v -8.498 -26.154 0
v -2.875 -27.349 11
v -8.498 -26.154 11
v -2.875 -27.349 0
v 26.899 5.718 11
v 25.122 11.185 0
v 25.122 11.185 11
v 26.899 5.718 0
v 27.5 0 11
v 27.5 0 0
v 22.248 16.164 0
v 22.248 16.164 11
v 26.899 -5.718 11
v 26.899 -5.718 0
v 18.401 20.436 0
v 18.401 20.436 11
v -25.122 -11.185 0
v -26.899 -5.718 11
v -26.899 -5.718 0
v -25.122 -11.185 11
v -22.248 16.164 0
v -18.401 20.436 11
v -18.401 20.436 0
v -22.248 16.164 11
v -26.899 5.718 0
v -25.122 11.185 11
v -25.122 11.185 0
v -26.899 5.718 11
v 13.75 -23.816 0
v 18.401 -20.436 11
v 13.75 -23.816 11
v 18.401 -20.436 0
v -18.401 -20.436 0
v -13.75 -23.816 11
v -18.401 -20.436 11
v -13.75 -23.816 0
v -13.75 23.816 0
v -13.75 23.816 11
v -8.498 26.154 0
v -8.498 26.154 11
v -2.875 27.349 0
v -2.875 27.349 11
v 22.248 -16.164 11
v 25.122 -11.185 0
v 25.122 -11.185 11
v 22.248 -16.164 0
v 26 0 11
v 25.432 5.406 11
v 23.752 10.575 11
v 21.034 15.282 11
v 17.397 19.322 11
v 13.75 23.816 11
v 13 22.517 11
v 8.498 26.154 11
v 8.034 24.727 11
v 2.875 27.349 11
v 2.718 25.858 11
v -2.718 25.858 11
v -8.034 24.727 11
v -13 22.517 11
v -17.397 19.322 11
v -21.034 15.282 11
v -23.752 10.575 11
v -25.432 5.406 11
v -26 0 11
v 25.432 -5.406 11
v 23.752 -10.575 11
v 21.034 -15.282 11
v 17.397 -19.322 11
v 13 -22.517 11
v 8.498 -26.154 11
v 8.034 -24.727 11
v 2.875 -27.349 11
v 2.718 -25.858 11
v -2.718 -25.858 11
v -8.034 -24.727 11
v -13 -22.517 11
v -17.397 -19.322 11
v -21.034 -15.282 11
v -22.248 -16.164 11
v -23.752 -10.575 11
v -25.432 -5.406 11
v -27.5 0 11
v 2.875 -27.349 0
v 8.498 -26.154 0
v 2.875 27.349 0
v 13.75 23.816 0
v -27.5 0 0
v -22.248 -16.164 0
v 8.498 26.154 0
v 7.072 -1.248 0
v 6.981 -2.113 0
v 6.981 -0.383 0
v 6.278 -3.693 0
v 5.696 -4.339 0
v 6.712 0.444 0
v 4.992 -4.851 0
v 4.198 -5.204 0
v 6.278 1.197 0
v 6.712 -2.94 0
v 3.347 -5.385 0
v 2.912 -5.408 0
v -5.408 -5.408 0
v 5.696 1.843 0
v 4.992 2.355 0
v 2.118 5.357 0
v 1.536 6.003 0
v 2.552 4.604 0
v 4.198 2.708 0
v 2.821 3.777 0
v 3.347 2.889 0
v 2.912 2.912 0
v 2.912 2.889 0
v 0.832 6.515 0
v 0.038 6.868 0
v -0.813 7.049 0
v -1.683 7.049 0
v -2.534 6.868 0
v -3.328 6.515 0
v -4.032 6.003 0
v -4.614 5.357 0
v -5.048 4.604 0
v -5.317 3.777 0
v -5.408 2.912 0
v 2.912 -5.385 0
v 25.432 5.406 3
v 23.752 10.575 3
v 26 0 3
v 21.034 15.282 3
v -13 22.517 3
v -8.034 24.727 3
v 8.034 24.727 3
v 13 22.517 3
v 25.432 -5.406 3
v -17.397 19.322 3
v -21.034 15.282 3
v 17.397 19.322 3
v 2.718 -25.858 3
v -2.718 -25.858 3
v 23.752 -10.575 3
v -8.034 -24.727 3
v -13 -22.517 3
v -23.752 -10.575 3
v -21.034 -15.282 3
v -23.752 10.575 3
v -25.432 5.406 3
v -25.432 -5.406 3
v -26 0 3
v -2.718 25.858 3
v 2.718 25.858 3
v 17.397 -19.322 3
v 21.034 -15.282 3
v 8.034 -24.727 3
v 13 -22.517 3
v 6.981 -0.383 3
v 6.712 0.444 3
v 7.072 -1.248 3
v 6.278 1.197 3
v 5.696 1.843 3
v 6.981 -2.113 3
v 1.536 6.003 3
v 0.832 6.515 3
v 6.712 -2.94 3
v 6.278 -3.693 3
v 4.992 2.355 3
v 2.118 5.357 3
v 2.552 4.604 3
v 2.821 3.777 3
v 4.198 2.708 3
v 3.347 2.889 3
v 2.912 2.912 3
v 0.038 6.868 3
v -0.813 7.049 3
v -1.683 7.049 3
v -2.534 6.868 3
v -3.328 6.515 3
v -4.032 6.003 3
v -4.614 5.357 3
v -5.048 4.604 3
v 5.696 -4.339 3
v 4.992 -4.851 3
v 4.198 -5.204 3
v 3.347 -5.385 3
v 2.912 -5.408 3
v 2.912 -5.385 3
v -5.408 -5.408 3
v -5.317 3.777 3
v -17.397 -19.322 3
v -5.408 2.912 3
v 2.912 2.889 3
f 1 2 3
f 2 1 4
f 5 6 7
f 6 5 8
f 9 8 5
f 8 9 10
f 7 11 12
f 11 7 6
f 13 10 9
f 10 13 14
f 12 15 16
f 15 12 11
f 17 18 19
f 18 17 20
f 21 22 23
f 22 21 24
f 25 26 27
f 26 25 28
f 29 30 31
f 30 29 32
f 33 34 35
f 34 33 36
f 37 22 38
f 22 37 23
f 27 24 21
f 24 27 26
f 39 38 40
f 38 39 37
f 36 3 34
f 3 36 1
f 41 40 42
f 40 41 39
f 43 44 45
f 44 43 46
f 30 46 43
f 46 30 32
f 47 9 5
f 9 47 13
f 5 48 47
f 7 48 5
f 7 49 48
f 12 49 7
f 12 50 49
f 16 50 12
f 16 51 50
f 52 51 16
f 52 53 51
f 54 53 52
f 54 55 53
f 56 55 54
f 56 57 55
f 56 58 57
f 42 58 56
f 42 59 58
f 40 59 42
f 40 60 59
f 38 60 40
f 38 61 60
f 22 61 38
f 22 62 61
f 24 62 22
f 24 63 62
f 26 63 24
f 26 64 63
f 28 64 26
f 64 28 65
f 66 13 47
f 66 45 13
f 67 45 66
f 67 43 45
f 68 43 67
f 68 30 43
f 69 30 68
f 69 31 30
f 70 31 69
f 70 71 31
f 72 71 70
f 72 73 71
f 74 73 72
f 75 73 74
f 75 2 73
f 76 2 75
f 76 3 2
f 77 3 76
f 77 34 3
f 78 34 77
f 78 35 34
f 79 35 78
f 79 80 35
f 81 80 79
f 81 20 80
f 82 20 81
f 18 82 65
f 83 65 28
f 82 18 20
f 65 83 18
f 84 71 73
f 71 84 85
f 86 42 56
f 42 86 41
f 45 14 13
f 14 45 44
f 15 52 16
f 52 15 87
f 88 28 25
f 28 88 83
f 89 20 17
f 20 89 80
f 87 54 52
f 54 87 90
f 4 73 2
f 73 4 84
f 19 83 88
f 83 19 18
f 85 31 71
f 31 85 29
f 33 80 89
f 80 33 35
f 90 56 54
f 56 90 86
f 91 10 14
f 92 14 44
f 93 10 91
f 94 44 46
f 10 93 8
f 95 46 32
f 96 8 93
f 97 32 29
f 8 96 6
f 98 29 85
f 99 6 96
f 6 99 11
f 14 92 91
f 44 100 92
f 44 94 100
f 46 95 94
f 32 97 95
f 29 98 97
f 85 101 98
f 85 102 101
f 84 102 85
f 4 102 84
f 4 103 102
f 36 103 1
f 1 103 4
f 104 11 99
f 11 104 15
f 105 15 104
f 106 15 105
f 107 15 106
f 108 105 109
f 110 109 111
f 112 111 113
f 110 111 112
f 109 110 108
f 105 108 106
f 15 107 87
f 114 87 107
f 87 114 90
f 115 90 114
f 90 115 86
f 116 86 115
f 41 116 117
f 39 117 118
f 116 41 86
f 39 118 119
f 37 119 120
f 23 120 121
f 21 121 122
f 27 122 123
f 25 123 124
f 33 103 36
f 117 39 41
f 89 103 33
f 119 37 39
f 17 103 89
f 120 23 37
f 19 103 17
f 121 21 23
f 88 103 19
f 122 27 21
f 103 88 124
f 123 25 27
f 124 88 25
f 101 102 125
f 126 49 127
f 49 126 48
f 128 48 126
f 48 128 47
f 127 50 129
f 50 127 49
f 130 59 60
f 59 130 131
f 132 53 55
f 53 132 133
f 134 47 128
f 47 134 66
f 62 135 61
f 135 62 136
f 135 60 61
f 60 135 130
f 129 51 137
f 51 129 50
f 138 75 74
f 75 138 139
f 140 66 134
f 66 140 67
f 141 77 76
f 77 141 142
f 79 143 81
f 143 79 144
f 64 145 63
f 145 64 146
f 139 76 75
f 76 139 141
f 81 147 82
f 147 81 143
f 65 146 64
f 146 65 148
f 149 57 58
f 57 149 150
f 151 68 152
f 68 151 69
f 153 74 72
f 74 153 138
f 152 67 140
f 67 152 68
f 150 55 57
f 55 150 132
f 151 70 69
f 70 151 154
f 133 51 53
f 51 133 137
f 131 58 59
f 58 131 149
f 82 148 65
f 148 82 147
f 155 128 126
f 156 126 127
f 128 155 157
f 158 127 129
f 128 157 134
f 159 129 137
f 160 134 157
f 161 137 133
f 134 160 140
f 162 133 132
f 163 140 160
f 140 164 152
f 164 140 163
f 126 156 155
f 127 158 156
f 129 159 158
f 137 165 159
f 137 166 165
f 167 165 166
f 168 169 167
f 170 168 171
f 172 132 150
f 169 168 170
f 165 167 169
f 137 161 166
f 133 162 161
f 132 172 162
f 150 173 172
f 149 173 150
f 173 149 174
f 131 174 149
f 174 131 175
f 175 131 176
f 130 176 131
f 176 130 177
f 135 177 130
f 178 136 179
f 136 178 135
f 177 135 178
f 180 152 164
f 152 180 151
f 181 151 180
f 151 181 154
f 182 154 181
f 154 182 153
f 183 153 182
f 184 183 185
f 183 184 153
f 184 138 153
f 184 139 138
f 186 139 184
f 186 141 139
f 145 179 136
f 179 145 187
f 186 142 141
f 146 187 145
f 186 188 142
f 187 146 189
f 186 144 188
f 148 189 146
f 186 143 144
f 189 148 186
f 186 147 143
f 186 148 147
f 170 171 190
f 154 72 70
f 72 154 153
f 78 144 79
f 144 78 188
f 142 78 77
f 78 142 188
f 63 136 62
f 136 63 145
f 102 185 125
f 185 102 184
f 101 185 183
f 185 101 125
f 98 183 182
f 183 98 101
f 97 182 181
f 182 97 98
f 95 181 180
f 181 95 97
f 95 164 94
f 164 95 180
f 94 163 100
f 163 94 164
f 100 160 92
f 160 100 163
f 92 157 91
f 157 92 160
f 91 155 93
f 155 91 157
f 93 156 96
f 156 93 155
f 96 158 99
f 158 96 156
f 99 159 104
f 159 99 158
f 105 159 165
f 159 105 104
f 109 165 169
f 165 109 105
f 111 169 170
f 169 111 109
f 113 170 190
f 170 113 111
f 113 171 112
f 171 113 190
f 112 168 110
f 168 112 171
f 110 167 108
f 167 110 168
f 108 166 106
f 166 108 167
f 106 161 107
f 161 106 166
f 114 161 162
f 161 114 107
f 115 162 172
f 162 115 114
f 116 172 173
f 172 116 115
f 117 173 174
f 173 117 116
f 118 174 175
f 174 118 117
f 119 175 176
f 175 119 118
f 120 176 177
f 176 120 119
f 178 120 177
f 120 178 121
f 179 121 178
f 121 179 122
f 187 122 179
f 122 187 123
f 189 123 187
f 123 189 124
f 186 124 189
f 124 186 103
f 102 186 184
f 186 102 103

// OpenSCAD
// could be changed
lens_outer_radius=52;
heart_size_factor=0.008;
wall_thickness=3;
shaft_leght=8;

//don`t change!
heart_scale=lens_outer_radius*heart_size_factor;

module flat_heart() {
  square(20,center=true);

  translate([10, 0, 0])
  circle(10);

  translate([0, 10, 0])
  circle(10);
}

difference()
{
    translate([0,0,0])cylinder(wall_thickness+shaft_leght,d=lens_outer_radius+wall_thickness);
    translate([0,0,wall_thickness])cylinder(shaft_leght,d=lens_outer_radius);

    linear_extrude(height=wall_thickness) 
    translate([-(heart_scale*3),-(heart_scale*3),0])scale([heart_scale,heart_scale,heart_scale])flat_heart();
}
